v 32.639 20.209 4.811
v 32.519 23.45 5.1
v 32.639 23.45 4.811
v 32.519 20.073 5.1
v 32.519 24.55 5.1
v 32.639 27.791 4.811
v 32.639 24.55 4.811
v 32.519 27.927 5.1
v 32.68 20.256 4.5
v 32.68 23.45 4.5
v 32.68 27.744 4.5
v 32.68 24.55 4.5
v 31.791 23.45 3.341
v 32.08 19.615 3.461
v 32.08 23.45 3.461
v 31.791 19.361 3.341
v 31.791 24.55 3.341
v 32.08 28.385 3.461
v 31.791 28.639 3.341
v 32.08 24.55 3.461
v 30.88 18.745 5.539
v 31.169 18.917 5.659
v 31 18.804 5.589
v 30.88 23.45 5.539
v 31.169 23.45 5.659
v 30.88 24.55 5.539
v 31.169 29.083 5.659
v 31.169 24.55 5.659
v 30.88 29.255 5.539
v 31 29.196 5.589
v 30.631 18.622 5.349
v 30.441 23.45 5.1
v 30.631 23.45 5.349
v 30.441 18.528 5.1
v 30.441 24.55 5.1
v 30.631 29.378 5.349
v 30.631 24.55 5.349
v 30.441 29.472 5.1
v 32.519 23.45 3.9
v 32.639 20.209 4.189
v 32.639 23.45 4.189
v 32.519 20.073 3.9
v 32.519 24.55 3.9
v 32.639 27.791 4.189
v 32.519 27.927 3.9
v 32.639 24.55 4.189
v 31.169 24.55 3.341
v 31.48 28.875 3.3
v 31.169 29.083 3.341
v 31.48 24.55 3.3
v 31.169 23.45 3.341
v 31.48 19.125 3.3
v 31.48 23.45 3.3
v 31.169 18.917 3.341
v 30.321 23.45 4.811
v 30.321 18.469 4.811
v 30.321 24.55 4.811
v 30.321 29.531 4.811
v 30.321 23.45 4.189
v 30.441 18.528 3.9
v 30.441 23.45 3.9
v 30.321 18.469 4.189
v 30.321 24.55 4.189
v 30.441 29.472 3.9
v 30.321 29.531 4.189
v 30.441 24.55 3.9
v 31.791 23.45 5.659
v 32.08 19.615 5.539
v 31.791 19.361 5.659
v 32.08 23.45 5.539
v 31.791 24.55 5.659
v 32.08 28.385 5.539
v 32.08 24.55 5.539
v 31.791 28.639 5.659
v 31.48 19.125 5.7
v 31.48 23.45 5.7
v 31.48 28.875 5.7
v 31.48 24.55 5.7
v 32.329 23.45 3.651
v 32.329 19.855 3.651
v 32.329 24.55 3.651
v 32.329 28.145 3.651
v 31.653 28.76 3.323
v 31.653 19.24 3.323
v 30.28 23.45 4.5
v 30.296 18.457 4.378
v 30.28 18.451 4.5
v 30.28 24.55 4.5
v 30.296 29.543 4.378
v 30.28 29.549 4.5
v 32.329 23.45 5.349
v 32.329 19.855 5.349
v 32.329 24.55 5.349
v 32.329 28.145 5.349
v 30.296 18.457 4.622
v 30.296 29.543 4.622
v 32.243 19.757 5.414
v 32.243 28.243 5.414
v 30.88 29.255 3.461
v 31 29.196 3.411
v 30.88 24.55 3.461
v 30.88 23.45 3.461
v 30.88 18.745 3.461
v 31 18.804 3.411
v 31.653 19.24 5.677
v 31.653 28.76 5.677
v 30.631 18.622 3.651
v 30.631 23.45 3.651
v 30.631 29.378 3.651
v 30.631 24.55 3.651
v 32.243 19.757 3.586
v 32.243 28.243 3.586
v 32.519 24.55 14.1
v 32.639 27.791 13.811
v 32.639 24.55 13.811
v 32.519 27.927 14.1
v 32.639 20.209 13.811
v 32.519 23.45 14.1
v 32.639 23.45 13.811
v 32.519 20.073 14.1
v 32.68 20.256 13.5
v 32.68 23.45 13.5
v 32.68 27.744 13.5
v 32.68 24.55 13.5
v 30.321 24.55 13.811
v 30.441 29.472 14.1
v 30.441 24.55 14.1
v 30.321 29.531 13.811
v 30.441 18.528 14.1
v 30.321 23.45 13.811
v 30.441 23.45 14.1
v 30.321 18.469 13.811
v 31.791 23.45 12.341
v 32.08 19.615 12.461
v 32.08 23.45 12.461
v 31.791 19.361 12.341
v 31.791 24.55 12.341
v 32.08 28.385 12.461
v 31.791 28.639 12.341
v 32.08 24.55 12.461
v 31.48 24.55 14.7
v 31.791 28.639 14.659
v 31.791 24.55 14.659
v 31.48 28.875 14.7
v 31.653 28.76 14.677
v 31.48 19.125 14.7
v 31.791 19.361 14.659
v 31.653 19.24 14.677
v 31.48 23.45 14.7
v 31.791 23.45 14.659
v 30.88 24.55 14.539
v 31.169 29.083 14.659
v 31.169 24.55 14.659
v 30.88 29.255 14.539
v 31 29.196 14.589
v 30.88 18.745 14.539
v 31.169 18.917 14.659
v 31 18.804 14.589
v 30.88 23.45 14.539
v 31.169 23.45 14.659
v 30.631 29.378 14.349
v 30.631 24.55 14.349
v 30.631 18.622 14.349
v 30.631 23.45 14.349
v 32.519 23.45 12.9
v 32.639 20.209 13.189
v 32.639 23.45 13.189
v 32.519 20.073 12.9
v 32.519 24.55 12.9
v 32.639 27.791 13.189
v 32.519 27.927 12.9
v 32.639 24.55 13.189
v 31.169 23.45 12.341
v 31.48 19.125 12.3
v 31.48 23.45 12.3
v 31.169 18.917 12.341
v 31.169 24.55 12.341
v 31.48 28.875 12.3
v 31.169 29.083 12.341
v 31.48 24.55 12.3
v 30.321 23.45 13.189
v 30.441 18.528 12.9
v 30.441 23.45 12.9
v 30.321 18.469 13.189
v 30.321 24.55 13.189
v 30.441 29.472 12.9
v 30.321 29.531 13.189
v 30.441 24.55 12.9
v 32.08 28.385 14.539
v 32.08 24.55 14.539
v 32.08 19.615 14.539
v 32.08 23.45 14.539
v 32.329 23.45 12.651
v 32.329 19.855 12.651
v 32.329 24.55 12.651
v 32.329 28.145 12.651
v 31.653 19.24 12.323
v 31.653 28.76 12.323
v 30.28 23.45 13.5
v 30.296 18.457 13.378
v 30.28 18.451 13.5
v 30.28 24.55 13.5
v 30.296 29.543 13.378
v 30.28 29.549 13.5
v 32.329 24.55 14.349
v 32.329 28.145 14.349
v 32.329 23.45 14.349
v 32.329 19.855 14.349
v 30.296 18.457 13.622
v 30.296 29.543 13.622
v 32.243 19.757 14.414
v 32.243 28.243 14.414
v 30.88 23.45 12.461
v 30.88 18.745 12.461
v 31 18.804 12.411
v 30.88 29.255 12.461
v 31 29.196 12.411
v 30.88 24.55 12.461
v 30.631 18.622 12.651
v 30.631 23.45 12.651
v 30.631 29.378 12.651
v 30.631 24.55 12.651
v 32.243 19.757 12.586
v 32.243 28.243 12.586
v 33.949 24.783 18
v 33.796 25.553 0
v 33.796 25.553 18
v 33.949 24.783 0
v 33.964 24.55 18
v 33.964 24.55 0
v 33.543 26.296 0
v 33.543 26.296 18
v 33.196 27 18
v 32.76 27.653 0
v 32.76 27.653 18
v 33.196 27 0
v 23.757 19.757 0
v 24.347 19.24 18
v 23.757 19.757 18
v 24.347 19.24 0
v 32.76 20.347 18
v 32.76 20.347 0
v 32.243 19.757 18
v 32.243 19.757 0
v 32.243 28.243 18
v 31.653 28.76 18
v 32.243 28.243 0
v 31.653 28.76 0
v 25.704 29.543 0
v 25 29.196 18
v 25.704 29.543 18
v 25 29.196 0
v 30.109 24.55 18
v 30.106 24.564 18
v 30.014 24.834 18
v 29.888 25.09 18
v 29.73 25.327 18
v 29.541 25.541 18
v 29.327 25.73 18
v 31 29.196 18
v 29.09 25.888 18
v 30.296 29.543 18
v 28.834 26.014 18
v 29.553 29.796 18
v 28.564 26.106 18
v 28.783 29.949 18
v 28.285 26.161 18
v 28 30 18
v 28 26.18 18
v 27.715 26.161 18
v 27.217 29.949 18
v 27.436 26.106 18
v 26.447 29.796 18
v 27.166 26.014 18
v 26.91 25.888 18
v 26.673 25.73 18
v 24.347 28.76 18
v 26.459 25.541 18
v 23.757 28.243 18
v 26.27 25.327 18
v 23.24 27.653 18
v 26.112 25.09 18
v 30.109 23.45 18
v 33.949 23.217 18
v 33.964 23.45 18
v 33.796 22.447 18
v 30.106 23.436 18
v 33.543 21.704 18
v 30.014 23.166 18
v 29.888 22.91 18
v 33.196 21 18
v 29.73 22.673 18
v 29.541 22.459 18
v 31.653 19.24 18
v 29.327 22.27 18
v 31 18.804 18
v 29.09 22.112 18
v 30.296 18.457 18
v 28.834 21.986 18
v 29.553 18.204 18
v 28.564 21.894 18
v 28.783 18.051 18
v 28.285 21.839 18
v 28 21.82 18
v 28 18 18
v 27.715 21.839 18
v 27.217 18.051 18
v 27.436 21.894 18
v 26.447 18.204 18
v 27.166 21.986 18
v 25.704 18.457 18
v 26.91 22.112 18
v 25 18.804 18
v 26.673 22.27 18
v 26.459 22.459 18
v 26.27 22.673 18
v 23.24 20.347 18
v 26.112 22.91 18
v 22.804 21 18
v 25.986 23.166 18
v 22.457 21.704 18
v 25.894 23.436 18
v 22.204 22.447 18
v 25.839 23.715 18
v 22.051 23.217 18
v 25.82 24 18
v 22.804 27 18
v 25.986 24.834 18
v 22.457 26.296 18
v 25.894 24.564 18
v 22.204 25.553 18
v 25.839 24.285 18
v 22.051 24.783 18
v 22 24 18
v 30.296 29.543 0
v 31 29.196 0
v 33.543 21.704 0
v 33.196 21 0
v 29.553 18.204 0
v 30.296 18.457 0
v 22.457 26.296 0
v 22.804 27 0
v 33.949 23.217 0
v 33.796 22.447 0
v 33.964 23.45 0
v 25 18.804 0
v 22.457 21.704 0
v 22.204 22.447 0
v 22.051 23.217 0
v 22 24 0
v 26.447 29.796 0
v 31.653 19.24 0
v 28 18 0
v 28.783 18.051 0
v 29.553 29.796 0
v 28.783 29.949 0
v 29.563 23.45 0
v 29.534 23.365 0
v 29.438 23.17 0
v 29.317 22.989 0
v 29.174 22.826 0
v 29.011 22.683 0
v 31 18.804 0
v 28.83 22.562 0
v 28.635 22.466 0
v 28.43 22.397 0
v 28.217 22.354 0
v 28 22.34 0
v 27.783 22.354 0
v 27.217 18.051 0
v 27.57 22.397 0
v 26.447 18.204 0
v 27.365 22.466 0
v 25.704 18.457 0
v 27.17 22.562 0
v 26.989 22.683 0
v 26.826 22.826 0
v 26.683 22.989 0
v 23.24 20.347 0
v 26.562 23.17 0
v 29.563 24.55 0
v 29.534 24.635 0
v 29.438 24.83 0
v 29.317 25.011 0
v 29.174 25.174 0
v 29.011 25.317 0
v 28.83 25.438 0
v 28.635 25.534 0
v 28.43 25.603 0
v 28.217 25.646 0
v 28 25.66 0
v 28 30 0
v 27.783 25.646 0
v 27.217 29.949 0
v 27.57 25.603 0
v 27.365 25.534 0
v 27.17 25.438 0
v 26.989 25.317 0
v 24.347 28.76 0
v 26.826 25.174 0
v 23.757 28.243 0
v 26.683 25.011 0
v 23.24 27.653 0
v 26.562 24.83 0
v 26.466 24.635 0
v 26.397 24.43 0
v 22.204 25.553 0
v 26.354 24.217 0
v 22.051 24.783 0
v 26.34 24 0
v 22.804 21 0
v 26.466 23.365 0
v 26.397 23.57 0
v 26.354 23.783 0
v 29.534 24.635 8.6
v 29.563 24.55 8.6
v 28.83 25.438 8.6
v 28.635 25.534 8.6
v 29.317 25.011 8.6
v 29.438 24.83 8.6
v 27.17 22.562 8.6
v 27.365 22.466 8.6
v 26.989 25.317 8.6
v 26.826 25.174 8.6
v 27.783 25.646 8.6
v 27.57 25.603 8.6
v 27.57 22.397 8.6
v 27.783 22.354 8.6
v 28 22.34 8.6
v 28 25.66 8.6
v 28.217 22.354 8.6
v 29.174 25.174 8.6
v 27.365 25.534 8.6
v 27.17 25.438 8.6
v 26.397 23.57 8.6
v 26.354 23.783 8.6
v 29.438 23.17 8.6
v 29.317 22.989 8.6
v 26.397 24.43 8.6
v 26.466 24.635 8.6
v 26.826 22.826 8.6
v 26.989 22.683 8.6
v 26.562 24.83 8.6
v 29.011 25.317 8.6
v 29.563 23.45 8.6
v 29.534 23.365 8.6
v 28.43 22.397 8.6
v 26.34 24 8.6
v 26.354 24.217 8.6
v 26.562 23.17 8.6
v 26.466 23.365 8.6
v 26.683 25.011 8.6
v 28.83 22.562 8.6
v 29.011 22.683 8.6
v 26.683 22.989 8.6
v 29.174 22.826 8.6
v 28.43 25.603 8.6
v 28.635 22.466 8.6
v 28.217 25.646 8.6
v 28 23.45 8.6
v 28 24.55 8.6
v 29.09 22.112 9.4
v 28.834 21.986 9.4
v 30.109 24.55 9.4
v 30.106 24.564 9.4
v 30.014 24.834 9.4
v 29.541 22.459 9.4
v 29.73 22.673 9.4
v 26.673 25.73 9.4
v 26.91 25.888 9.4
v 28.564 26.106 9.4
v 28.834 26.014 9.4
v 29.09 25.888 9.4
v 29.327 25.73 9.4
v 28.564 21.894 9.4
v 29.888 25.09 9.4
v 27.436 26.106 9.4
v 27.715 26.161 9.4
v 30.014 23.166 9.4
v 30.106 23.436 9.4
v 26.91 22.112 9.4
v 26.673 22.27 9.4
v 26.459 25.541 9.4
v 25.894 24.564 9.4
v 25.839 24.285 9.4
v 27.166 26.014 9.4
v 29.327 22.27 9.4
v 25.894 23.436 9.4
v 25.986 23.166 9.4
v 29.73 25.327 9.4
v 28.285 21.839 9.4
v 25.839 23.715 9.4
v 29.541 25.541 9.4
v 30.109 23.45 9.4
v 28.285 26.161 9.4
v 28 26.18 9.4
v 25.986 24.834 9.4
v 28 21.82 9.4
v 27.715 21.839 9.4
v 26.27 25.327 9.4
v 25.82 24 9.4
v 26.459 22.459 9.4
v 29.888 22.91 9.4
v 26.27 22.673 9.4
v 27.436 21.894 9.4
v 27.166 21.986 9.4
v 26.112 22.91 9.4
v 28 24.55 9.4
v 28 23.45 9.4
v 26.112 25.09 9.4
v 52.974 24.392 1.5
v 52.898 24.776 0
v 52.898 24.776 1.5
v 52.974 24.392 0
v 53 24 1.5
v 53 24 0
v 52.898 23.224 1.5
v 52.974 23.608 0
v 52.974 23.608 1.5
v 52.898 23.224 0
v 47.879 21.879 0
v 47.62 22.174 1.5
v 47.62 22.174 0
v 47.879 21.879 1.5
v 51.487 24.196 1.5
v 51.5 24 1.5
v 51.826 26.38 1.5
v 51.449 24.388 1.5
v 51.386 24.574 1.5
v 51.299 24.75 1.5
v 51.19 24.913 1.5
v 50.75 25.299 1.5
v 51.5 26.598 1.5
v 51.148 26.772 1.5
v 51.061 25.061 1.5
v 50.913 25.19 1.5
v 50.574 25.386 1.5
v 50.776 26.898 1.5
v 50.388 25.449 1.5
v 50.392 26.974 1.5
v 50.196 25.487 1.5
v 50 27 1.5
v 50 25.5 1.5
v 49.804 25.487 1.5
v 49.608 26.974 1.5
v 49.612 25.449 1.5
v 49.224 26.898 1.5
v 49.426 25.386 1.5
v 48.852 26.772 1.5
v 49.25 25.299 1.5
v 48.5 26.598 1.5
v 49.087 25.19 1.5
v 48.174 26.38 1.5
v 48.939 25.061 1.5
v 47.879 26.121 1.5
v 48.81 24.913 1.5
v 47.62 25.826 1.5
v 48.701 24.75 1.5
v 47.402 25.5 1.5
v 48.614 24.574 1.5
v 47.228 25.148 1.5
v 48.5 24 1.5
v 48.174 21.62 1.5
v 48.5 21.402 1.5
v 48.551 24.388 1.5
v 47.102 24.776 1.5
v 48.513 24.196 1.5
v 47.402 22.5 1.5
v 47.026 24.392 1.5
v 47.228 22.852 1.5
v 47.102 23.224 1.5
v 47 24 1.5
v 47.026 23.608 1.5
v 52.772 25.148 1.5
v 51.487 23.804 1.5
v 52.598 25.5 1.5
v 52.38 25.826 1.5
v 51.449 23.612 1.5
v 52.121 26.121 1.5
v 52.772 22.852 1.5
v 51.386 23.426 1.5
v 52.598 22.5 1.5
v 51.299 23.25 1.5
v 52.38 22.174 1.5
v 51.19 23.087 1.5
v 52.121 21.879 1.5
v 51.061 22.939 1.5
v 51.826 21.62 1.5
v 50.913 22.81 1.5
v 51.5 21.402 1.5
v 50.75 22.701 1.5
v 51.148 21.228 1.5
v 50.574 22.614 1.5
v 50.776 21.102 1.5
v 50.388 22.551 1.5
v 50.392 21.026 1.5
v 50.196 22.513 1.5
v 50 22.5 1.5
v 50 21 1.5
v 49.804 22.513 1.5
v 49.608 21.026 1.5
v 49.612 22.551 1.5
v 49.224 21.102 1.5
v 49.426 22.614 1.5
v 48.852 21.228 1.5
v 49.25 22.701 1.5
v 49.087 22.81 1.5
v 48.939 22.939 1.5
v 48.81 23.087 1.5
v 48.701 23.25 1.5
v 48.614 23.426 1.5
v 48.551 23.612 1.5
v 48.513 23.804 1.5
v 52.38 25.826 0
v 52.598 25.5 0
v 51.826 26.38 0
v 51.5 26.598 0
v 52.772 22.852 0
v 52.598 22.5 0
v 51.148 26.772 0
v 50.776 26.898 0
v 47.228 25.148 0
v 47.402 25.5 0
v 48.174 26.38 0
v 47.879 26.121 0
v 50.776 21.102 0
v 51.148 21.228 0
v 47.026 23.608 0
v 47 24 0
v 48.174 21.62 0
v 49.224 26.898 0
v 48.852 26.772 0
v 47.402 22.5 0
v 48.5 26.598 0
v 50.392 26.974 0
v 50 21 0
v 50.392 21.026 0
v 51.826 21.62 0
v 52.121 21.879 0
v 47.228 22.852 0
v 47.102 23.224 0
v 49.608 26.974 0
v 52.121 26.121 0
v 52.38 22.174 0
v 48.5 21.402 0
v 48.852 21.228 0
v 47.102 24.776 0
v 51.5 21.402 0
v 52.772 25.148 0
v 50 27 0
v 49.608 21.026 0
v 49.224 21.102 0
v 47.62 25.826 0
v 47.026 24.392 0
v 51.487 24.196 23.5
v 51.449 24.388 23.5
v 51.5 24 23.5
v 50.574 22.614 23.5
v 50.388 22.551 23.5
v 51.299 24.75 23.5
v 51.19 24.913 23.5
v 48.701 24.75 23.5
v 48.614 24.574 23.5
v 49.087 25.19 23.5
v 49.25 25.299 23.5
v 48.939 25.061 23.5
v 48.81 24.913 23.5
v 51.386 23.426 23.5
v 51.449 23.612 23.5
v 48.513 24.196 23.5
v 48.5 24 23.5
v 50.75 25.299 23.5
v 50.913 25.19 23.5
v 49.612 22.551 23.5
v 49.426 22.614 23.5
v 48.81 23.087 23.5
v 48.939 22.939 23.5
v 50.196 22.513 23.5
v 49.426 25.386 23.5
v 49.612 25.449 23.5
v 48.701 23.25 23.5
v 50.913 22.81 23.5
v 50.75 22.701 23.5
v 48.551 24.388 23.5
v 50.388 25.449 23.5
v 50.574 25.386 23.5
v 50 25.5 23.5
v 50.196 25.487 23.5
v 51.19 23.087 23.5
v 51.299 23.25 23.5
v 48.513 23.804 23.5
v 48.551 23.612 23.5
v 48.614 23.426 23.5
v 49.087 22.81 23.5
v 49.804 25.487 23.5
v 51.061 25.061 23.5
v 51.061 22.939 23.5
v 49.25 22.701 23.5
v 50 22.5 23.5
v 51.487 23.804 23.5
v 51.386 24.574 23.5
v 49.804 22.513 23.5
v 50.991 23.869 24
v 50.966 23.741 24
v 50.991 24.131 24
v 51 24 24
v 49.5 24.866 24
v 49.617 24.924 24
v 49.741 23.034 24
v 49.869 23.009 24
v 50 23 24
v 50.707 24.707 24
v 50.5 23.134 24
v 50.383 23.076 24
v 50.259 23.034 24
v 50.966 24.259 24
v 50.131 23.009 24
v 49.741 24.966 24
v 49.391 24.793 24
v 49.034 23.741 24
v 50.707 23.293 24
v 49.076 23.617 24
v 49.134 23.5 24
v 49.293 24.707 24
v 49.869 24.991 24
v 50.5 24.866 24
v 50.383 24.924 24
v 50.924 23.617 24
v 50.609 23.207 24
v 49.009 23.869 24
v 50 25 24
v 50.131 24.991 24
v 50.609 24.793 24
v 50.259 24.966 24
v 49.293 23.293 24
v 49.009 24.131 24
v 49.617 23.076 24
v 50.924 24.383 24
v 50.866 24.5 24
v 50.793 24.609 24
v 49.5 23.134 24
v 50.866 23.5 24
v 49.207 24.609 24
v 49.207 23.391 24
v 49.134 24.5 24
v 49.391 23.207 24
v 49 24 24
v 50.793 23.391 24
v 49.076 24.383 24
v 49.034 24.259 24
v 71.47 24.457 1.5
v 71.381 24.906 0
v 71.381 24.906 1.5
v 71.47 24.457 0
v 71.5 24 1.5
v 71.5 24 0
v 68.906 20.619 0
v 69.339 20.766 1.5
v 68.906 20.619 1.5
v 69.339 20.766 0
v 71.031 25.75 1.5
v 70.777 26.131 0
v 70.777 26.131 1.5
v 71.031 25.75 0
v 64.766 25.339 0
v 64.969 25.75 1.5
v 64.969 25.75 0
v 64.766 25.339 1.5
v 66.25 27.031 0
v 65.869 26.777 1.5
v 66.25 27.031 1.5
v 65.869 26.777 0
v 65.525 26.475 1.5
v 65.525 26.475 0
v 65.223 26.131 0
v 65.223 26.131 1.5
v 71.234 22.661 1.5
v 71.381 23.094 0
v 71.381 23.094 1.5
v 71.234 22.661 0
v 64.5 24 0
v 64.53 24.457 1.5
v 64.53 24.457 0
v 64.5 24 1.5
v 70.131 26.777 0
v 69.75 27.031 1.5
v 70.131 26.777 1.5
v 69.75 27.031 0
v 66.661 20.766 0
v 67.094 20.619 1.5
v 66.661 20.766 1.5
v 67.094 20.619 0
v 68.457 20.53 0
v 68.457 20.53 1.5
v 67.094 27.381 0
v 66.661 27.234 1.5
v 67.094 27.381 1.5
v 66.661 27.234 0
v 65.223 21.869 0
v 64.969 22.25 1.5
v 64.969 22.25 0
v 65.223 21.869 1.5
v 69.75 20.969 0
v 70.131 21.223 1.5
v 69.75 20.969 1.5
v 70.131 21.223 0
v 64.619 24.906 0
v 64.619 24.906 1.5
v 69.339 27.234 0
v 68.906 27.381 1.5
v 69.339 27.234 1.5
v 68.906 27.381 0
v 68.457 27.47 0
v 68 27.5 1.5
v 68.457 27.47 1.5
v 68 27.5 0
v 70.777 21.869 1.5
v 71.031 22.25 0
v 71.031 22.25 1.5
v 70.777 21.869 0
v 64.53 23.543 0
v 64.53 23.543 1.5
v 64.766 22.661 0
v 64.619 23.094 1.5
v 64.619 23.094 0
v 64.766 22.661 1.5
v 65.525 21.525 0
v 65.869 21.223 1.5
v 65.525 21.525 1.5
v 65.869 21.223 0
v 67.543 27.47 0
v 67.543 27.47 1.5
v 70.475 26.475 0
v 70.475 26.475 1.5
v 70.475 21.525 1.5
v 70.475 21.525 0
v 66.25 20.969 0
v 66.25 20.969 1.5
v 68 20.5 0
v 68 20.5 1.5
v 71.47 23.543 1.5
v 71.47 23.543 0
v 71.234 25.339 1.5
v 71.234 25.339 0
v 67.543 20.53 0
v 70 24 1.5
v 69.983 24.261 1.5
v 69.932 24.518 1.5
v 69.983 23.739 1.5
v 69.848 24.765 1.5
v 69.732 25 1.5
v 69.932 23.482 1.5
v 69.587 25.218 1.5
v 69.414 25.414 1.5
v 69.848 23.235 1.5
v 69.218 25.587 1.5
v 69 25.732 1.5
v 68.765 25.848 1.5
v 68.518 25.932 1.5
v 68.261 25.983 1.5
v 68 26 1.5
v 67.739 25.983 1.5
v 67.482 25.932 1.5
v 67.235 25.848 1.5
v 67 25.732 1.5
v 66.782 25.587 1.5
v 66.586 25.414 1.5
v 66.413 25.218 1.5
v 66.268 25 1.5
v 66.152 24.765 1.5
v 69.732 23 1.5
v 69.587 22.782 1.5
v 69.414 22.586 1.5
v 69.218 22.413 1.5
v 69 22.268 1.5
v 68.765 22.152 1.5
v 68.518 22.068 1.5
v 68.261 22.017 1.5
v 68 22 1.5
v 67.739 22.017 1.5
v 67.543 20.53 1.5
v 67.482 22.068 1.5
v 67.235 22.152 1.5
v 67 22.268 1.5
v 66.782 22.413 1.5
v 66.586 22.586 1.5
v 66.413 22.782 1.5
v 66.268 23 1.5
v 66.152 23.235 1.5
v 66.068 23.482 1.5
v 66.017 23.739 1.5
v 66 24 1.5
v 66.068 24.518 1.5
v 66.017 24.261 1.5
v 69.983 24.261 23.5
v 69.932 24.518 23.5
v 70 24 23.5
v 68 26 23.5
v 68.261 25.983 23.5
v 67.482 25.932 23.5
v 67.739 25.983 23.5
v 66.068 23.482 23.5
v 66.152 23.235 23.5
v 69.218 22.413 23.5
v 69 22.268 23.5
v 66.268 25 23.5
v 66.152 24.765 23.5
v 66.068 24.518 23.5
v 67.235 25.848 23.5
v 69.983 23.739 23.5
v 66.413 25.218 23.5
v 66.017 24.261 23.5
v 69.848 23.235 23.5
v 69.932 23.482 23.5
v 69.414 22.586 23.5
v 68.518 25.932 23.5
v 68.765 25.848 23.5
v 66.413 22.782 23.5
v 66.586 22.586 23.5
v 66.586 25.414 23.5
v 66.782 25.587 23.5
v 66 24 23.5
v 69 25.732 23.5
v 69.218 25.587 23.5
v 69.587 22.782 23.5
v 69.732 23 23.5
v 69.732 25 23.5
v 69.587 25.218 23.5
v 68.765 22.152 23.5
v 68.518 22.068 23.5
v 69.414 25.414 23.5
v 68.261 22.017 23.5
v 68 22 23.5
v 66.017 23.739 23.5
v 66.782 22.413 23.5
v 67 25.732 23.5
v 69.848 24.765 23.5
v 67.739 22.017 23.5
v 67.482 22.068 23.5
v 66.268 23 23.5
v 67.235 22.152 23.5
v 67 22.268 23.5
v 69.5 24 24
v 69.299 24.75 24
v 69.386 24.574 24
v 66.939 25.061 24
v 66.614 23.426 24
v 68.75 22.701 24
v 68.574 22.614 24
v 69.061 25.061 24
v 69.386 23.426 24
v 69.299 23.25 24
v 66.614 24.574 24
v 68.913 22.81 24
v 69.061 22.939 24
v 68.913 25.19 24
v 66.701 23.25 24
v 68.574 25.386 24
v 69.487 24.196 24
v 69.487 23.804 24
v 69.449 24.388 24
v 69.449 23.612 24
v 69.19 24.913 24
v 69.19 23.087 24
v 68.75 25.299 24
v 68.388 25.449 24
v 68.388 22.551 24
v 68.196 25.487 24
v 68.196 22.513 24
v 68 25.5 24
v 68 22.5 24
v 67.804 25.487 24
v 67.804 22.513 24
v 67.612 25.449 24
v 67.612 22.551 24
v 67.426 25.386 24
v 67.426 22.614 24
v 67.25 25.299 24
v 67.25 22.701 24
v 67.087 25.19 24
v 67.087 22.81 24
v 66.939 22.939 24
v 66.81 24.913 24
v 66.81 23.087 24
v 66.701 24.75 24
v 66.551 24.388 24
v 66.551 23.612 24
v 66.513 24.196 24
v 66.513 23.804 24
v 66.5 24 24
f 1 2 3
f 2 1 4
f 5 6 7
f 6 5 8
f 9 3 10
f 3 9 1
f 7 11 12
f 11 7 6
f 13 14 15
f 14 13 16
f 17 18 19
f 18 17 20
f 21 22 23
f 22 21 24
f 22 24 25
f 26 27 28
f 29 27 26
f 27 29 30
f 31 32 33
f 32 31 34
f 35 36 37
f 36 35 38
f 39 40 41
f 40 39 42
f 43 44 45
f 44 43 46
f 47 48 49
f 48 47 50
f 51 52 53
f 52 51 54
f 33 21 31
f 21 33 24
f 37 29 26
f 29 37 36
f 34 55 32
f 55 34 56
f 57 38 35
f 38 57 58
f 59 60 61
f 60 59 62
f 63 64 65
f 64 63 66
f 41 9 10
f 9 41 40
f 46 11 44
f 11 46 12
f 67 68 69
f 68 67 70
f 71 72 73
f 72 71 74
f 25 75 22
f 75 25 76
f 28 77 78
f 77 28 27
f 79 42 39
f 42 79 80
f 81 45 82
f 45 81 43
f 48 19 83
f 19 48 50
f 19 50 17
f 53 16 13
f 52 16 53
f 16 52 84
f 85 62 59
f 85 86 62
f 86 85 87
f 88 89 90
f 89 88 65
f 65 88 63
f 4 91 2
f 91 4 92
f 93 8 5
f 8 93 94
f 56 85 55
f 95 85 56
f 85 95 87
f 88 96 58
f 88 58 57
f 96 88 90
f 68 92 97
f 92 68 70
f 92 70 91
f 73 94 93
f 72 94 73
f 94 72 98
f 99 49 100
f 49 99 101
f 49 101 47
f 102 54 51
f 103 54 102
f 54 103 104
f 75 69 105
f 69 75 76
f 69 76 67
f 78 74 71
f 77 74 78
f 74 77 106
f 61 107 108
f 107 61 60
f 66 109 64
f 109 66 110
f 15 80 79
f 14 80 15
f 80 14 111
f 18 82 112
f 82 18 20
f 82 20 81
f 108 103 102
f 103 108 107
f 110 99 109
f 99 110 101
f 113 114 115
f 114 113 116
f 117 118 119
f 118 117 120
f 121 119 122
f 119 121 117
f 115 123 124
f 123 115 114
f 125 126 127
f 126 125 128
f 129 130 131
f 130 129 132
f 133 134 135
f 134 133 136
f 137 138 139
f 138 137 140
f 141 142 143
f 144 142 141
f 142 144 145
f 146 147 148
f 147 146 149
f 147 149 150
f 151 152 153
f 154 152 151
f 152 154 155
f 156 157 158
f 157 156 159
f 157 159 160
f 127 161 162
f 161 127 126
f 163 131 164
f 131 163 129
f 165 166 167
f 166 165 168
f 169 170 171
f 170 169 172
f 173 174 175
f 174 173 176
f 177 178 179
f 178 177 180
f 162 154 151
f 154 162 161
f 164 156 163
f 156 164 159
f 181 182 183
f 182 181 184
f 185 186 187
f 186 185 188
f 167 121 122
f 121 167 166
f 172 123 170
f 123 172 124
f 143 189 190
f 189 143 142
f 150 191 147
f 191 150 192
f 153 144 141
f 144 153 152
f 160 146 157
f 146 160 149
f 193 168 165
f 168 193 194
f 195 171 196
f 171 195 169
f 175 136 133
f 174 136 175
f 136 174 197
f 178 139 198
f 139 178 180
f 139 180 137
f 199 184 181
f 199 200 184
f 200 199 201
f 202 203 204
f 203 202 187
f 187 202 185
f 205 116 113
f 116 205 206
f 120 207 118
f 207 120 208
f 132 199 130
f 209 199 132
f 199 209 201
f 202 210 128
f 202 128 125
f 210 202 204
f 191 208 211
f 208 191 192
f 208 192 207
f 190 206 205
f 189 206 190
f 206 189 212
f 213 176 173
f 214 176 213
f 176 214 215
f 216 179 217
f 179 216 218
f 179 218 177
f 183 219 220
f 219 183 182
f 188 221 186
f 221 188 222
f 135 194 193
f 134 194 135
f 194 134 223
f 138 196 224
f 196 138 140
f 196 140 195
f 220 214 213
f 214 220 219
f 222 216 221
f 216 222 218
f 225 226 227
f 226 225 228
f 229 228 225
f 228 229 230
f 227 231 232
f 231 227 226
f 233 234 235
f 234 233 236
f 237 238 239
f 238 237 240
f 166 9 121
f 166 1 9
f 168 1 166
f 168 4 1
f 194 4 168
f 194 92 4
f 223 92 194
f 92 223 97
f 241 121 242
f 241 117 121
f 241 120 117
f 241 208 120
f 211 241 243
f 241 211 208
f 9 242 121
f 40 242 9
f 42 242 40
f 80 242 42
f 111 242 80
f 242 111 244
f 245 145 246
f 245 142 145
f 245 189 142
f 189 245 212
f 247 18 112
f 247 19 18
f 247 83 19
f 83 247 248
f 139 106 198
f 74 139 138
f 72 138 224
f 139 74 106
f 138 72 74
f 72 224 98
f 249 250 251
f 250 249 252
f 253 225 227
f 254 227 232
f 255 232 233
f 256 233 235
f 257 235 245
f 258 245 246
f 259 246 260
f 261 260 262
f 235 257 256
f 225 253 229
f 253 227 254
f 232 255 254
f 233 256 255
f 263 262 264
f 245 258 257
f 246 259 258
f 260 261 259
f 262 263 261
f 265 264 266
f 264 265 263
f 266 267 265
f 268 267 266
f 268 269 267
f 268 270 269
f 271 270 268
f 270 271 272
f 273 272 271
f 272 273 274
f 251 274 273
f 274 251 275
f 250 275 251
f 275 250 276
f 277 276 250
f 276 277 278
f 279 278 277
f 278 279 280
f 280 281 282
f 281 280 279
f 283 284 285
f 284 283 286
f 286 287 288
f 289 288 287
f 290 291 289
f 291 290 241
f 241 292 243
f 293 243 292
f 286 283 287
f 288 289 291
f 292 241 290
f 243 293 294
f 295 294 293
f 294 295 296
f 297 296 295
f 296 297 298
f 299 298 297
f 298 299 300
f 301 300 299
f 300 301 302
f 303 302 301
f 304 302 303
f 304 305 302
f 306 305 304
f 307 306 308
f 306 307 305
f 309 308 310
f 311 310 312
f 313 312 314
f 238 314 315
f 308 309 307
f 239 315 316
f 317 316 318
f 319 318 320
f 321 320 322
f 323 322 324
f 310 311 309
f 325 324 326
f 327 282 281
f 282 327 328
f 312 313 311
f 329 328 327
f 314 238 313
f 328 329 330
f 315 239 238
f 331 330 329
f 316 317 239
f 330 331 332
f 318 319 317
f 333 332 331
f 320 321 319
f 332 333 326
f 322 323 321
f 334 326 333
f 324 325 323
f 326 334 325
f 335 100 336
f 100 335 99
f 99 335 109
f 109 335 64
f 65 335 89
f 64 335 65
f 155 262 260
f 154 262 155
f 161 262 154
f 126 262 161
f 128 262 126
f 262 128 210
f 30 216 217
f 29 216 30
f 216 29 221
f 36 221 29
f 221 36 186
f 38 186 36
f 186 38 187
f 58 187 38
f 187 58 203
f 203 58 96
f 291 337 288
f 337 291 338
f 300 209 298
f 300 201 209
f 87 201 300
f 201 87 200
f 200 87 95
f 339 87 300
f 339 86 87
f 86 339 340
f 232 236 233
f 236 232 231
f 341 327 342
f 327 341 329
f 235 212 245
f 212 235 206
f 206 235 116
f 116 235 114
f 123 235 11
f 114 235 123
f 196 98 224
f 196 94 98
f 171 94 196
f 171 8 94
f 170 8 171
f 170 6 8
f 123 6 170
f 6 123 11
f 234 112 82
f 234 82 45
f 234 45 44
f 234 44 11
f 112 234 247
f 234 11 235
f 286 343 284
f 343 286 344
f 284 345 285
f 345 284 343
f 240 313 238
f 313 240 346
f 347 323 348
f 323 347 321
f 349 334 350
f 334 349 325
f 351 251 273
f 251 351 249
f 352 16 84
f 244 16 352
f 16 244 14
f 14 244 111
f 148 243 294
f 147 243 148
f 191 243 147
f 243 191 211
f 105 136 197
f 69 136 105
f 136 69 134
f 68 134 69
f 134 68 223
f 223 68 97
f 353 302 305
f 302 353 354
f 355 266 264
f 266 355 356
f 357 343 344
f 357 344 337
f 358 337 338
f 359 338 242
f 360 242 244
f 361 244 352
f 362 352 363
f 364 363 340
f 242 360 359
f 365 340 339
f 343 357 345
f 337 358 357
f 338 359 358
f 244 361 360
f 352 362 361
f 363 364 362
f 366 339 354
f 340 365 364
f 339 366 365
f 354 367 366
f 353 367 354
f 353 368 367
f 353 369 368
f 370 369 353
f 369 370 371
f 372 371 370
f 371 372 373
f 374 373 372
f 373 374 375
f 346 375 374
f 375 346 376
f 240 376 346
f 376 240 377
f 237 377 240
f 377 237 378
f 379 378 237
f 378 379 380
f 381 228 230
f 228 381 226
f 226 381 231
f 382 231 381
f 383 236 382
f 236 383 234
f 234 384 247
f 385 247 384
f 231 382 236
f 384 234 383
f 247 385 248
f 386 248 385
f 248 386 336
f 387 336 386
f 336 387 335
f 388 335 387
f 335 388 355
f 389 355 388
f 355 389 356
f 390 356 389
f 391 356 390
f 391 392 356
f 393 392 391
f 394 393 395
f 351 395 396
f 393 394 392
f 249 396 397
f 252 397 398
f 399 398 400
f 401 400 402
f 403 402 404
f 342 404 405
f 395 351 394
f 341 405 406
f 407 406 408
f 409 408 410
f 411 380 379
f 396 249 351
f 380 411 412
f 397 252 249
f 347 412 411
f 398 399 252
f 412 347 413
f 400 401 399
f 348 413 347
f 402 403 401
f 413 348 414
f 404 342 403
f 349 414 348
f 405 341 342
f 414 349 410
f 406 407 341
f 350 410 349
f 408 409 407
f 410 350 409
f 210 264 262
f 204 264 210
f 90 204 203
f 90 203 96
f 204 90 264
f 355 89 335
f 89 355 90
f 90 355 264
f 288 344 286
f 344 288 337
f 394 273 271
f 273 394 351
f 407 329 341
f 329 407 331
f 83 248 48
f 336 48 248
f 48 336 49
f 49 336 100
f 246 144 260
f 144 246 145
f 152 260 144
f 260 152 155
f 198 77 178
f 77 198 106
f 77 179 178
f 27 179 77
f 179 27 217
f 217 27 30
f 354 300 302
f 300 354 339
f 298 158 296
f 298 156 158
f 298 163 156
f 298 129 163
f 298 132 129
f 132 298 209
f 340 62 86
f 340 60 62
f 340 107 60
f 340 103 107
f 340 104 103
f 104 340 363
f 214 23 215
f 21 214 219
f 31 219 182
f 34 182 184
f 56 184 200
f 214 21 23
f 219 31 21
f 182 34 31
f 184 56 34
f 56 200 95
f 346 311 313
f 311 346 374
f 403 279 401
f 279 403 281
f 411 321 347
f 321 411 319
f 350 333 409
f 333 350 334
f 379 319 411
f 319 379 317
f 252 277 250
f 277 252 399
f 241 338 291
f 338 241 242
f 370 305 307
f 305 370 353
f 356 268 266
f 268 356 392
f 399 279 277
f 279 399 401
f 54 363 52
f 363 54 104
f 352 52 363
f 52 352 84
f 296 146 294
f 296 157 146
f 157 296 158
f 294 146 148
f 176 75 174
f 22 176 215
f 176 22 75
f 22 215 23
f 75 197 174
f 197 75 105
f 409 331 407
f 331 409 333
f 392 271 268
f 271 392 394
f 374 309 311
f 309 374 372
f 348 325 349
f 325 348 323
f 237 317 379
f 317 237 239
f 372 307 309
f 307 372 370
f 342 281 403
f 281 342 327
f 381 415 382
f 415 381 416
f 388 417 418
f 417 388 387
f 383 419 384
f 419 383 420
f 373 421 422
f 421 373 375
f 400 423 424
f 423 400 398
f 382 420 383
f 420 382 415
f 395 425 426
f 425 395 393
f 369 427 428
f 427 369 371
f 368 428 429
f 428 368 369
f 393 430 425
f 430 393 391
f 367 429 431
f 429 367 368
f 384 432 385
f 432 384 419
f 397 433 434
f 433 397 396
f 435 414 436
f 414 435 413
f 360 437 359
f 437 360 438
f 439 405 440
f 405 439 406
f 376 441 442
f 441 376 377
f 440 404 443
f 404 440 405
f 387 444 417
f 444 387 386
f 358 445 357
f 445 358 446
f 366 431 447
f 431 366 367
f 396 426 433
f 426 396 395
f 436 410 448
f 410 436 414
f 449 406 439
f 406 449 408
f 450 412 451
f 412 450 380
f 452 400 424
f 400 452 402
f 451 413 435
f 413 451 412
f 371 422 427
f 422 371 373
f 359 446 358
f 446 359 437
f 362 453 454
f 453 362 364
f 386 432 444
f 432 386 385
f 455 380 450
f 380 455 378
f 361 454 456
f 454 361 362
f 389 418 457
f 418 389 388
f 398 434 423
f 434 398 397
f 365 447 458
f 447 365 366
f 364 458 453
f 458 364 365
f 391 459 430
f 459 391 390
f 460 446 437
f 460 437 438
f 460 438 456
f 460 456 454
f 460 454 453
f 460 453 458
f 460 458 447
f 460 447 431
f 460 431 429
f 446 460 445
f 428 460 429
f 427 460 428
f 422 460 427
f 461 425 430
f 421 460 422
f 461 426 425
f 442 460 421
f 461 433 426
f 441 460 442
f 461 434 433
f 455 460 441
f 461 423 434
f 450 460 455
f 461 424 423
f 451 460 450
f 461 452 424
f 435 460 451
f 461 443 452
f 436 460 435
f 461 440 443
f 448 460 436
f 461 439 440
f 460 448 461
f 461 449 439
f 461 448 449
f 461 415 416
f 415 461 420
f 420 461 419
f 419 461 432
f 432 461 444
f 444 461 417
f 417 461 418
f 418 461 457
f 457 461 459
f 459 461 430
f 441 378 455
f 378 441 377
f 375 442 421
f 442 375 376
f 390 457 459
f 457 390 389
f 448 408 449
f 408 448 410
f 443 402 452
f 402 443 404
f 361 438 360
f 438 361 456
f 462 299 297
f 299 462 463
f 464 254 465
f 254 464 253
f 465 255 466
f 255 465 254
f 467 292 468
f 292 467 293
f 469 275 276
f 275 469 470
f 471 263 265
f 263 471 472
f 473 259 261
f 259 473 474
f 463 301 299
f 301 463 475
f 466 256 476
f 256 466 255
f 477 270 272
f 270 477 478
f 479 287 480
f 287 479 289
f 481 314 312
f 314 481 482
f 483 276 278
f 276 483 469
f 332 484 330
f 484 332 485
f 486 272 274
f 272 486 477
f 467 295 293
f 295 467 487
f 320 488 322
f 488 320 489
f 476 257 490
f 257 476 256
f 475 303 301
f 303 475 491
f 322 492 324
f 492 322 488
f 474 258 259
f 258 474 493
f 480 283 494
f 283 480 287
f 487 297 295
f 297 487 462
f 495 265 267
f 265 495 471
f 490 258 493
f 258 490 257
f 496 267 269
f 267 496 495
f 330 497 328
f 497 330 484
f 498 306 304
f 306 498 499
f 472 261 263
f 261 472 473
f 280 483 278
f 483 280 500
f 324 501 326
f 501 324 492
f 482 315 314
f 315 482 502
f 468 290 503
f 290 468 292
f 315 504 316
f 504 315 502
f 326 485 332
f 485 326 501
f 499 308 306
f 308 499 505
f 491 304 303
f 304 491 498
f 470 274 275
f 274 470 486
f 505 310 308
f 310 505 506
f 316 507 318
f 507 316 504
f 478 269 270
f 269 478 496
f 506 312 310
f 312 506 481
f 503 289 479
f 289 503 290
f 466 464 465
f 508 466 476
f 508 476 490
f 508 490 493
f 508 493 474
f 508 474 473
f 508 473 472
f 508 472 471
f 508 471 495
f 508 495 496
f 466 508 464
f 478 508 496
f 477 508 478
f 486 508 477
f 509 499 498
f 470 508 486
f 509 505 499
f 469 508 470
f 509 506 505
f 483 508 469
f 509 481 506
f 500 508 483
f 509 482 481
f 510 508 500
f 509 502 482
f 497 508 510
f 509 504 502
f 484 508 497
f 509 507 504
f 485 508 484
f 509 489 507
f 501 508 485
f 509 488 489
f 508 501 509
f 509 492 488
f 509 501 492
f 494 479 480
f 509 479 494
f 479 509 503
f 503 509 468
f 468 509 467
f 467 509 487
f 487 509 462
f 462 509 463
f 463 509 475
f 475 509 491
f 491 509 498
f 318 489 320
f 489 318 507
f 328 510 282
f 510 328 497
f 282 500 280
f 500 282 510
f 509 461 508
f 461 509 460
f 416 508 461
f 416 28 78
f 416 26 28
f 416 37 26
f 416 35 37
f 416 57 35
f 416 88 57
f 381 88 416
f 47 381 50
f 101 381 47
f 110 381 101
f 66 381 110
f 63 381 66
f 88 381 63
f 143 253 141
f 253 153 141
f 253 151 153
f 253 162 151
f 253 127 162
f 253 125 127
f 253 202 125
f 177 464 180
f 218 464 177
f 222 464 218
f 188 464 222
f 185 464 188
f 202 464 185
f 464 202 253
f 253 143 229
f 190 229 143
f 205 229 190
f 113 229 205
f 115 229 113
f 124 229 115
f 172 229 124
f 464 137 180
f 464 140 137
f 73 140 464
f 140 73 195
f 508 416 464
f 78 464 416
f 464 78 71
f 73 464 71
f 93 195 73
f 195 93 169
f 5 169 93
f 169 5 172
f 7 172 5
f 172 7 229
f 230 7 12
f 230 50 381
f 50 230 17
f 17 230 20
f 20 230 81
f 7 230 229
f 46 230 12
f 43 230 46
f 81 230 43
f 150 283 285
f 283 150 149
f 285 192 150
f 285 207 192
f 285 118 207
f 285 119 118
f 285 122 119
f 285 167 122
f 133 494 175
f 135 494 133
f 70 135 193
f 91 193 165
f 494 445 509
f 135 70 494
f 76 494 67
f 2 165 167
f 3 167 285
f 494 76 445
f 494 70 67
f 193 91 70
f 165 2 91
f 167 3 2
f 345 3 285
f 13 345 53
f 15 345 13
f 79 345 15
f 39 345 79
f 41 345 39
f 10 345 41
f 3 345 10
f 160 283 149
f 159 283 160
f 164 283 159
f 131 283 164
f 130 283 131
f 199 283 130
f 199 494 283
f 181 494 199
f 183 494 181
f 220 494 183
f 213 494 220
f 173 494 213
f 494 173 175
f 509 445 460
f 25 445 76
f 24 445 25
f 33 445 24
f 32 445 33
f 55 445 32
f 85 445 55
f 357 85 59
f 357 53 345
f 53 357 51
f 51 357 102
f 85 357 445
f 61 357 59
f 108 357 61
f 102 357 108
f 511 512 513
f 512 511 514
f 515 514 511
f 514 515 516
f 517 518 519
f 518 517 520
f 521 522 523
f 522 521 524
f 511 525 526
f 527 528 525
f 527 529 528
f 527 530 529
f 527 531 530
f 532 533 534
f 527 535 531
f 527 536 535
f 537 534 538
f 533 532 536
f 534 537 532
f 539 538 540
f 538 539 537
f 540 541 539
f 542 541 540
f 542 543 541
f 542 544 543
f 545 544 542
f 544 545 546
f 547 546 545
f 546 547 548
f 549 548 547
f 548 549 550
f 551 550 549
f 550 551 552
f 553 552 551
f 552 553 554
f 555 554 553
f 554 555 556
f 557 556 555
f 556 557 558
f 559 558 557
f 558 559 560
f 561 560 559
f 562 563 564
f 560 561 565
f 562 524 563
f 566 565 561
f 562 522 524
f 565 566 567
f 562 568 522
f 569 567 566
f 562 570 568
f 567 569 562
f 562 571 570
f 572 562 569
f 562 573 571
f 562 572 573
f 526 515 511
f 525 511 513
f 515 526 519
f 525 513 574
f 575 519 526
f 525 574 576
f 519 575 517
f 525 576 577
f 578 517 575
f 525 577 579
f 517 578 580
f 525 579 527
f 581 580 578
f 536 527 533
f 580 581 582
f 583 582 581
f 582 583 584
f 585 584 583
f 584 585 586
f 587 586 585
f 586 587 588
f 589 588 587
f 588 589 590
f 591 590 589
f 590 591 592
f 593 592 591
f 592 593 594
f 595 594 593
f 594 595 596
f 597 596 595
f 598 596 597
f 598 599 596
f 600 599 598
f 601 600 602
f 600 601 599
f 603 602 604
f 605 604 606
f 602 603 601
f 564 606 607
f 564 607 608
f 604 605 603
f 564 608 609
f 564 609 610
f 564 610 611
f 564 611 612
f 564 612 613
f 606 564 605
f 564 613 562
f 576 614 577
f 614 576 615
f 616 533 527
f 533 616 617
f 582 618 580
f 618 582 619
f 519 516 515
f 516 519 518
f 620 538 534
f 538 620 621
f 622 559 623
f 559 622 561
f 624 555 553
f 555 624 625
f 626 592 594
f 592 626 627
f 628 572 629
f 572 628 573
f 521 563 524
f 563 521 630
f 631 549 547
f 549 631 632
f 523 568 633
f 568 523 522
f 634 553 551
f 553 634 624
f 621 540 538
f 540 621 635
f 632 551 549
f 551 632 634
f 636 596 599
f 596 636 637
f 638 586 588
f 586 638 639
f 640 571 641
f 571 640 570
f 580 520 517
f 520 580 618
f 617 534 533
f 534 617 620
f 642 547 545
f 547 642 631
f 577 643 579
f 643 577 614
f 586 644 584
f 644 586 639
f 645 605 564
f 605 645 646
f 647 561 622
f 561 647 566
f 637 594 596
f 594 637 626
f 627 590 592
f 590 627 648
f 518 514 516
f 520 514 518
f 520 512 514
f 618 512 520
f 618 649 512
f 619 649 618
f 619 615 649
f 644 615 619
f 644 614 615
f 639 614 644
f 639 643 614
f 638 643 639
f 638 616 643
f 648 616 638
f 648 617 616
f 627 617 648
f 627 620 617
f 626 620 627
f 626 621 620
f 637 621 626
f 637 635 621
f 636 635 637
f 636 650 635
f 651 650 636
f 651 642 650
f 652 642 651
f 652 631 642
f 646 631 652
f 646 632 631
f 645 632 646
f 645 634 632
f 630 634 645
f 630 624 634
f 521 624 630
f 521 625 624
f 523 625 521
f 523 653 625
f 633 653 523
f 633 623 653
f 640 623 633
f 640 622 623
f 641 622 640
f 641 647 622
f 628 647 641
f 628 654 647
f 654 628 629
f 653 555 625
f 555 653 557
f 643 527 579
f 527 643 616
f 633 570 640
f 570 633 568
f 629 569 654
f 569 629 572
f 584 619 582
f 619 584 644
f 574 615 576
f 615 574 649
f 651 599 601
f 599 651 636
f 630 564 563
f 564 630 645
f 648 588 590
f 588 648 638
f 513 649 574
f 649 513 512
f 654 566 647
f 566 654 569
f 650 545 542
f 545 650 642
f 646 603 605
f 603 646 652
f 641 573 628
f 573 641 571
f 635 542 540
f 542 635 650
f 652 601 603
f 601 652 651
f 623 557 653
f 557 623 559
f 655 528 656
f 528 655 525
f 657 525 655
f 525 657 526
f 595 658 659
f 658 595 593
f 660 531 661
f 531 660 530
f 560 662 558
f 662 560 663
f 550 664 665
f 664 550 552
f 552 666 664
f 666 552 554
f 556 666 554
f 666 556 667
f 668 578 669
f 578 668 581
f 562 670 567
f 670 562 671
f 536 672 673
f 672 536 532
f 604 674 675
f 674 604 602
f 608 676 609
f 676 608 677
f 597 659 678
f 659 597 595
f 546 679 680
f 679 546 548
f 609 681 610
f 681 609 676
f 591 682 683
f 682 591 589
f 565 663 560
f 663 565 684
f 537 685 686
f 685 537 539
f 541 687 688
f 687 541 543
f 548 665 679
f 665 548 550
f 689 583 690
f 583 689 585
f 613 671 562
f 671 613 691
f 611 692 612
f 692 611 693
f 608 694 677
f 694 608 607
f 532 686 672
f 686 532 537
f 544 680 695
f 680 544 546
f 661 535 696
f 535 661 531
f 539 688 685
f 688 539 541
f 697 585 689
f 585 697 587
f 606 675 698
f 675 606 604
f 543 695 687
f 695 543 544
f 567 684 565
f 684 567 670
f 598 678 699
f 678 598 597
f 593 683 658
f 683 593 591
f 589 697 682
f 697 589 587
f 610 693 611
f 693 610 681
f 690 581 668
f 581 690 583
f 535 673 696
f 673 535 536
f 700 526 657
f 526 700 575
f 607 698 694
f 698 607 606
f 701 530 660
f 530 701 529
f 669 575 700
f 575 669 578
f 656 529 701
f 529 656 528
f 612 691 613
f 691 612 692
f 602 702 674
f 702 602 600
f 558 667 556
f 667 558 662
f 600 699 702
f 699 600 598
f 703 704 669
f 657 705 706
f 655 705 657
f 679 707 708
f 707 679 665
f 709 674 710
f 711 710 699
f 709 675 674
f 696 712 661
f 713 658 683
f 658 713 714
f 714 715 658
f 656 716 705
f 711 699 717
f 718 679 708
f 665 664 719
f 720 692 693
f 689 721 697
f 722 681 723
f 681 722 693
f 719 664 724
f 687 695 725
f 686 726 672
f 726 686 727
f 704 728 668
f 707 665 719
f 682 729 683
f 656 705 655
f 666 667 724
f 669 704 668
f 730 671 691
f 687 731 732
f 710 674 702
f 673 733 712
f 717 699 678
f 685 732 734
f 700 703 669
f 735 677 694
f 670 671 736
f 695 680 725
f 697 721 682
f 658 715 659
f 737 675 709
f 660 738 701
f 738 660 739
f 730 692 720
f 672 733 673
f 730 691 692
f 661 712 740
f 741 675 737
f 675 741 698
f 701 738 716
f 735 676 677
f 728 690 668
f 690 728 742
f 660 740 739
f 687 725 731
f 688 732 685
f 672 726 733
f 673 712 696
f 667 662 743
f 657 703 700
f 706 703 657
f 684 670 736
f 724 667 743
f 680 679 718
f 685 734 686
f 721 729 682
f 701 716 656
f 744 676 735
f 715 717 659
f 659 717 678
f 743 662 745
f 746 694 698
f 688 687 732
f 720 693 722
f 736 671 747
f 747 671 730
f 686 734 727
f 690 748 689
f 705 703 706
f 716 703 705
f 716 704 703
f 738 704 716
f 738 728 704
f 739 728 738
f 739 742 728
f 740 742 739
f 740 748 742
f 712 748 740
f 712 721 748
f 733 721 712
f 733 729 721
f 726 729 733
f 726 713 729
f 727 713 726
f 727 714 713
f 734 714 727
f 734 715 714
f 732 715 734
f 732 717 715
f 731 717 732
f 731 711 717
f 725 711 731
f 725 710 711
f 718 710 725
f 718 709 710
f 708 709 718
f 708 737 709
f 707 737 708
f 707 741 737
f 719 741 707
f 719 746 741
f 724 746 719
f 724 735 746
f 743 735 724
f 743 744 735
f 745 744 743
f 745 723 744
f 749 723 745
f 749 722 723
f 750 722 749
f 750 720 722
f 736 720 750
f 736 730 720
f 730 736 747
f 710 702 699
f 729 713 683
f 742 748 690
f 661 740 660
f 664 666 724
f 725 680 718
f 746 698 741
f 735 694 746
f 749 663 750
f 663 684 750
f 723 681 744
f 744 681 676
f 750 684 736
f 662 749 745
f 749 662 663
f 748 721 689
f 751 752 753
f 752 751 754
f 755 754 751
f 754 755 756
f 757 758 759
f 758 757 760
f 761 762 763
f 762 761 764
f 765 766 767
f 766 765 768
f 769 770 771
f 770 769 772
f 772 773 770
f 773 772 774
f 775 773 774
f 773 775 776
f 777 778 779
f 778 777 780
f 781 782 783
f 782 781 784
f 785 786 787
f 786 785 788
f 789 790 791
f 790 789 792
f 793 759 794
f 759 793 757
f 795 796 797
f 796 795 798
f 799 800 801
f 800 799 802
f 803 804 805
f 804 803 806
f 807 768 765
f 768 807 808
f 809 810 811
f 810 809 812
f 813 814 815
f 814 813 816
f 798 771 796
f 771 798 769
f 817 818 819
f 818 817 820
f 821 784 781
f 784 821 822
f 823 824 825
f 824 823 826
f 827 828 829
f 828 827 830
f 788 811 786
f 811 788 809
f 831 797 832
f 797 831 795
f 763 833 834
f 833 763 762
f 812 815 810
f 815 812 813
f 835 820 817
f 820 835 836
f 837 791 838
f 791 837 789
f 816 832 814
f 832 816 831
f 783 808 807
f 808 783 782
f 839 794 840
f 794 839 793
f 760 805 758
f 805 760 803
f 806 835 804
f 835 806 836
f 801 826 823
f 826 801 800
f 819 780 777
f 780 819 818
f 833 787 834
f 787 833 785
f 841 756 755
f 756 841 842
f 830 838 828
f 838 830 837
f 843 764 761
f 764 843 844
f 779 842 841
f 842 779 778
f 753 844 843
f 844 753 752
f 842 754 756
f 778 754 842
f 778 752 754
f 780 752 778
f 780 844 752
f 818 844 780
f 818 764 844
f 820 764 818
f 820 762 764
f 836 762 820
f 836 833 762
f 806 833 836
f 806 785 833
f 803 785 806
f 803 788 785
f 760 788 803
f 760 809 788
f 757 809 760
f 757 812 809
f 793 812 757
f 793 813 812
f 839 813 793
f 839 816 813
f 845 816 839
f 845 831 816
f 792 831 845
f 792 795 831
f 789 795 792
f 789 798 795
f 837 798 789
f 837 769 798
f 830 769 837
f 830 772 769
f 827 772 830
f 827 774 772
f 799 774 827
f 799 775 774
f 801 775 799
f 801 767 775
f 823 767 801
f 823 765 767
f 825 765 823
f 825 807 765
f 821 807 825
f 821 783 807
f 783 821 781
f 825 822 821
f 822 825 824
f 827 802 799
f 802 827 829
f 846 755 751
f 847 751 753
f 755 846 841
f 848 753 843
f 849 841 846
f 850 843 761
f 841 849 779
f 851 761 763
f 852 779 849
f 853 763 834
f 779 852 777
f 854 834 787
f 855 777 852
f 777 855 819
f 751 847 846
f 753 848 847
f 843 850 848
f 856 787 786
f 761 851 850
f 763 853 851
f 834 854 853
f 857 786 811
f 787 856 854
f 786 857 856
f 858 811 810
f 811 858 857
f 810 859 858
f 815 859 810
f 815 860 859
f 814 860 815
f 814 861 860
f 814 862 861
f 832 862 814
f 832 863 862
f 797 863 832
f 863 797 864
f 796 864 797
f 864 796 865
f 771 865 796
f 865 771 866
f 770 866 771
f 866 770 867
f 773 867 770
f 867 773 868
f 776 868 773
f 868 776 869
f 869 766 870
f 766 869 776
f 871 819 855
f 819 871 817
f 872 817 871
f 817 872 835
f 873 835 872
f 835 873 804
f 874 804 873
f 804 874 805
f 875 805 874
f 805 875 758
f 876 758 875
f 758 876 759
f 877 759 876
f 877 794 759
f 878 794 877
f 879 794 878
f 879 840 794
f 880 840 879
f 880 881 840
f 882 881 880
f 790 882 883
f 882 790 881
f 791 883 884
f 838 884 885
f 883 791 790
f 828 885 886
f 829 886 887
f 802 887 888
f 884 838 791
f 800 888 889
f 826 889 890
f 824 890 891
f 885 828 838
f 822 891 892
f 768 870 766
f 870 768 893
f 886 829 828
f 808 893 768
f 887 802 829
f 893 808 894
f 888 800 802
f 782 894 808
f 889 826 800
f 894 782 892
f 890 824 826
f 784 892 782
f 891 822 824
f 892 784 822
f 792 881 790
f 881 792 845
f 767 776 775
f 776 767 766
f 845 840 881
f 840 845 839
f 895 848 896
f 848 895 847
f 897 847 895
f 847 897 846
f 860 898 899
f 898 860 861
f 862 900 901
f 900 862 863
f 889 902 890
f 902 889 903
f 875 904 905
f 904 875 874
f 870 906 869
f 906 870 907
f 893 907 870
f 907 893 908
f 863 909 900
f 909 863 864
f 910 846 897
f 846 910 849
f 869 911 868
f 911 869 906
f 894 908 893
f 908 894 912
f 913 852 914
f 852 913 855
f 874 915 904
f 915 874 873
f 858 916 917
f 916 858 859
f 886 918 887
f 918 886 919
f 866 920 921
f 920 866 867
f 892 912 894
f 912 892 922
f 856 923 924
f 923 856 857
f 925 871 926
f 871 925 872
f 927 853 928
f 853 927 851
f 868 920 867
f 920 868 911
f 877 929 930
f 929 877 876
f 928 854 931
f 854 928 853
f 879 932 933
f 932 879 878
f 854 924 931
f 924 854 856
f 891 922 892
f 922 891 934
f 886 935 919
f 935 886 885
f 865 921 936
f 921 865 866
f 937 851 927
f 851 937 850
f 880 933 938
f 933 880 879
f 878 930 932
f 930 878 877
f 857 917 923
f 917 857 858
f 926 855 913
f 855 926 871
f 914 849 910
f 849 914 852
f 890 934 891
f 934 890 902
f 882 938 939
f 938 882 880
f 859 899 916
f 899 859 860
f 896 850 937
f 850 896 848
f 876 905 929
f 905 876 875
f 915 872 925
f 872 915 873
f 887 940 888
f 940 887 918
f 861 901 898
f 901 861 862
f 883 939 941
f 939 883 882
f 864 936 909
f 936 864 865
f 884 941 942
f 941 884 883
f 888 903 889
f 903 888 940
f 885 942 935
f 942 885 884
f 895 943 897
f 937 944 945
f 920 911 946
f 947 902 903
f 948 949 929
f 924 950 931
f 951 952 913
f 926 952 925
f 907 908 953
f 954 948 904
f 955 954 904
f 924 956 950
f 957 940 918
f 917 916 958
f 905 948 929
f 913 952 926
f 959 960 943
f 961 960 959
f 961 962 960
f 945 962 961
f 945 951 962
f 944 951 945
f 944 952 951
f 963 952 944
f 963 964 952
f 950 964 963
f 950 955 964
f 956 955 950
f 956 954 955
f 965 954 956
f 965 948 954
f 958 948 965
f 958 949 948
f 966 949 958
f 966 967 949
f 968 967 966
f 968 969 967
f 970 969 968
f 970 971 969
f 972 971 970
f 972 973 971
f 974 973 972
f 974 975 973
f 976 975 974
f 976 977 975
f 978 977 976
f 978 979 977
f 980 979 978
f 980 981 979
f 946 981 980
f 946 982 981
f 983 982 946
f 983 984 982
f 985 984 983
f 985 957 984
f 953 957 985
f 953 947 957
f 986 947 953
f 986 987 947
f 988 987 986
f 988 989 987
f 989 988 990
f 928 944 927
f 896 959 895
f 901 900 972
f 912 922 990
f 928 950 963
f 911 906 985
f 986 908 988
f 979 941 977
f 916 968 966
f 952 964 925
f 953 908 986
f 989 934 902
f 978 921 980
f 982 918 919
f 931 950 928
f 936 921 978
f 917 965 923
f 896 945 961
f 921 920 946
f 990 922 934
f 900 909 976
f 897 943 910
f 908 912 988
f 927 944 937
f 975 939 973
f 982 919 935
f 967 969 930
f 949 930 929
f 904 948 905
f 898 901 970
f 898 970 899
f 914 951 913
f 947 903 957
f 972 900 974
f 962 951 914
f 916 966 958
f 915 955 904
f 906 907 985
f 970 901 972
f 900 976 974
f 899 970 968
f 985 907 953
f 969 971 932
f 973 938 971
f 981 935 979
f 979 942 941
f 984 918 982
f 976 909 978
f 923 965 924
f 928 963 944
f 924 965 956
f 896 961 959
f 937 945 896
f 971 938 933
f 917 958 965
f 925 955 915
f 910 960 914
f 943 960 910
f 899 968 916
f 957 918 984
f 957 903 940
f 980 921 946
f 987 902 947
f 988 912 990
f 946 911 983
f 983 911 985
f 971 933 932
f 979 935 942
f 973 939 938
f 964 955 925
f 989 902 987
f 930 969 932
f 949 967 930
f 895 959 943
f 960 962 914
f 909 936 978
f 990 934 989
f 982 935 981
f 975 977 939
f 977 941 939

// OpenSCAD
/*
Sample 131: Kompakte asymmetrische Wellenkupplung — 3 auf 4 mm
Generated from the FDM Mechanical Sample Library.
Units: millimetres.

Override examples:
  openscad -o custom.stl -D 'view="plate"' -D 'render_fn=64' model.scad
  openscad -o preview.png -D 'view="assembly"' model.scad
*/
use <../../../library/fdm_mechanisms.scad>

render_fn = is_undef(render_fn) ? 48 : render_fn;
view = is_undef(view) ? "plate" : view;
$fn = render_fn;

sample_micro_shaft_coupler(
    view=view,
    input_d=3,
    output_d=4,
    input_clearance=0.16,
    output_clearance=0.18,
    length=18,
    outer_d=12,
    fastener=2.4,
    axial_stop=0.8
);
